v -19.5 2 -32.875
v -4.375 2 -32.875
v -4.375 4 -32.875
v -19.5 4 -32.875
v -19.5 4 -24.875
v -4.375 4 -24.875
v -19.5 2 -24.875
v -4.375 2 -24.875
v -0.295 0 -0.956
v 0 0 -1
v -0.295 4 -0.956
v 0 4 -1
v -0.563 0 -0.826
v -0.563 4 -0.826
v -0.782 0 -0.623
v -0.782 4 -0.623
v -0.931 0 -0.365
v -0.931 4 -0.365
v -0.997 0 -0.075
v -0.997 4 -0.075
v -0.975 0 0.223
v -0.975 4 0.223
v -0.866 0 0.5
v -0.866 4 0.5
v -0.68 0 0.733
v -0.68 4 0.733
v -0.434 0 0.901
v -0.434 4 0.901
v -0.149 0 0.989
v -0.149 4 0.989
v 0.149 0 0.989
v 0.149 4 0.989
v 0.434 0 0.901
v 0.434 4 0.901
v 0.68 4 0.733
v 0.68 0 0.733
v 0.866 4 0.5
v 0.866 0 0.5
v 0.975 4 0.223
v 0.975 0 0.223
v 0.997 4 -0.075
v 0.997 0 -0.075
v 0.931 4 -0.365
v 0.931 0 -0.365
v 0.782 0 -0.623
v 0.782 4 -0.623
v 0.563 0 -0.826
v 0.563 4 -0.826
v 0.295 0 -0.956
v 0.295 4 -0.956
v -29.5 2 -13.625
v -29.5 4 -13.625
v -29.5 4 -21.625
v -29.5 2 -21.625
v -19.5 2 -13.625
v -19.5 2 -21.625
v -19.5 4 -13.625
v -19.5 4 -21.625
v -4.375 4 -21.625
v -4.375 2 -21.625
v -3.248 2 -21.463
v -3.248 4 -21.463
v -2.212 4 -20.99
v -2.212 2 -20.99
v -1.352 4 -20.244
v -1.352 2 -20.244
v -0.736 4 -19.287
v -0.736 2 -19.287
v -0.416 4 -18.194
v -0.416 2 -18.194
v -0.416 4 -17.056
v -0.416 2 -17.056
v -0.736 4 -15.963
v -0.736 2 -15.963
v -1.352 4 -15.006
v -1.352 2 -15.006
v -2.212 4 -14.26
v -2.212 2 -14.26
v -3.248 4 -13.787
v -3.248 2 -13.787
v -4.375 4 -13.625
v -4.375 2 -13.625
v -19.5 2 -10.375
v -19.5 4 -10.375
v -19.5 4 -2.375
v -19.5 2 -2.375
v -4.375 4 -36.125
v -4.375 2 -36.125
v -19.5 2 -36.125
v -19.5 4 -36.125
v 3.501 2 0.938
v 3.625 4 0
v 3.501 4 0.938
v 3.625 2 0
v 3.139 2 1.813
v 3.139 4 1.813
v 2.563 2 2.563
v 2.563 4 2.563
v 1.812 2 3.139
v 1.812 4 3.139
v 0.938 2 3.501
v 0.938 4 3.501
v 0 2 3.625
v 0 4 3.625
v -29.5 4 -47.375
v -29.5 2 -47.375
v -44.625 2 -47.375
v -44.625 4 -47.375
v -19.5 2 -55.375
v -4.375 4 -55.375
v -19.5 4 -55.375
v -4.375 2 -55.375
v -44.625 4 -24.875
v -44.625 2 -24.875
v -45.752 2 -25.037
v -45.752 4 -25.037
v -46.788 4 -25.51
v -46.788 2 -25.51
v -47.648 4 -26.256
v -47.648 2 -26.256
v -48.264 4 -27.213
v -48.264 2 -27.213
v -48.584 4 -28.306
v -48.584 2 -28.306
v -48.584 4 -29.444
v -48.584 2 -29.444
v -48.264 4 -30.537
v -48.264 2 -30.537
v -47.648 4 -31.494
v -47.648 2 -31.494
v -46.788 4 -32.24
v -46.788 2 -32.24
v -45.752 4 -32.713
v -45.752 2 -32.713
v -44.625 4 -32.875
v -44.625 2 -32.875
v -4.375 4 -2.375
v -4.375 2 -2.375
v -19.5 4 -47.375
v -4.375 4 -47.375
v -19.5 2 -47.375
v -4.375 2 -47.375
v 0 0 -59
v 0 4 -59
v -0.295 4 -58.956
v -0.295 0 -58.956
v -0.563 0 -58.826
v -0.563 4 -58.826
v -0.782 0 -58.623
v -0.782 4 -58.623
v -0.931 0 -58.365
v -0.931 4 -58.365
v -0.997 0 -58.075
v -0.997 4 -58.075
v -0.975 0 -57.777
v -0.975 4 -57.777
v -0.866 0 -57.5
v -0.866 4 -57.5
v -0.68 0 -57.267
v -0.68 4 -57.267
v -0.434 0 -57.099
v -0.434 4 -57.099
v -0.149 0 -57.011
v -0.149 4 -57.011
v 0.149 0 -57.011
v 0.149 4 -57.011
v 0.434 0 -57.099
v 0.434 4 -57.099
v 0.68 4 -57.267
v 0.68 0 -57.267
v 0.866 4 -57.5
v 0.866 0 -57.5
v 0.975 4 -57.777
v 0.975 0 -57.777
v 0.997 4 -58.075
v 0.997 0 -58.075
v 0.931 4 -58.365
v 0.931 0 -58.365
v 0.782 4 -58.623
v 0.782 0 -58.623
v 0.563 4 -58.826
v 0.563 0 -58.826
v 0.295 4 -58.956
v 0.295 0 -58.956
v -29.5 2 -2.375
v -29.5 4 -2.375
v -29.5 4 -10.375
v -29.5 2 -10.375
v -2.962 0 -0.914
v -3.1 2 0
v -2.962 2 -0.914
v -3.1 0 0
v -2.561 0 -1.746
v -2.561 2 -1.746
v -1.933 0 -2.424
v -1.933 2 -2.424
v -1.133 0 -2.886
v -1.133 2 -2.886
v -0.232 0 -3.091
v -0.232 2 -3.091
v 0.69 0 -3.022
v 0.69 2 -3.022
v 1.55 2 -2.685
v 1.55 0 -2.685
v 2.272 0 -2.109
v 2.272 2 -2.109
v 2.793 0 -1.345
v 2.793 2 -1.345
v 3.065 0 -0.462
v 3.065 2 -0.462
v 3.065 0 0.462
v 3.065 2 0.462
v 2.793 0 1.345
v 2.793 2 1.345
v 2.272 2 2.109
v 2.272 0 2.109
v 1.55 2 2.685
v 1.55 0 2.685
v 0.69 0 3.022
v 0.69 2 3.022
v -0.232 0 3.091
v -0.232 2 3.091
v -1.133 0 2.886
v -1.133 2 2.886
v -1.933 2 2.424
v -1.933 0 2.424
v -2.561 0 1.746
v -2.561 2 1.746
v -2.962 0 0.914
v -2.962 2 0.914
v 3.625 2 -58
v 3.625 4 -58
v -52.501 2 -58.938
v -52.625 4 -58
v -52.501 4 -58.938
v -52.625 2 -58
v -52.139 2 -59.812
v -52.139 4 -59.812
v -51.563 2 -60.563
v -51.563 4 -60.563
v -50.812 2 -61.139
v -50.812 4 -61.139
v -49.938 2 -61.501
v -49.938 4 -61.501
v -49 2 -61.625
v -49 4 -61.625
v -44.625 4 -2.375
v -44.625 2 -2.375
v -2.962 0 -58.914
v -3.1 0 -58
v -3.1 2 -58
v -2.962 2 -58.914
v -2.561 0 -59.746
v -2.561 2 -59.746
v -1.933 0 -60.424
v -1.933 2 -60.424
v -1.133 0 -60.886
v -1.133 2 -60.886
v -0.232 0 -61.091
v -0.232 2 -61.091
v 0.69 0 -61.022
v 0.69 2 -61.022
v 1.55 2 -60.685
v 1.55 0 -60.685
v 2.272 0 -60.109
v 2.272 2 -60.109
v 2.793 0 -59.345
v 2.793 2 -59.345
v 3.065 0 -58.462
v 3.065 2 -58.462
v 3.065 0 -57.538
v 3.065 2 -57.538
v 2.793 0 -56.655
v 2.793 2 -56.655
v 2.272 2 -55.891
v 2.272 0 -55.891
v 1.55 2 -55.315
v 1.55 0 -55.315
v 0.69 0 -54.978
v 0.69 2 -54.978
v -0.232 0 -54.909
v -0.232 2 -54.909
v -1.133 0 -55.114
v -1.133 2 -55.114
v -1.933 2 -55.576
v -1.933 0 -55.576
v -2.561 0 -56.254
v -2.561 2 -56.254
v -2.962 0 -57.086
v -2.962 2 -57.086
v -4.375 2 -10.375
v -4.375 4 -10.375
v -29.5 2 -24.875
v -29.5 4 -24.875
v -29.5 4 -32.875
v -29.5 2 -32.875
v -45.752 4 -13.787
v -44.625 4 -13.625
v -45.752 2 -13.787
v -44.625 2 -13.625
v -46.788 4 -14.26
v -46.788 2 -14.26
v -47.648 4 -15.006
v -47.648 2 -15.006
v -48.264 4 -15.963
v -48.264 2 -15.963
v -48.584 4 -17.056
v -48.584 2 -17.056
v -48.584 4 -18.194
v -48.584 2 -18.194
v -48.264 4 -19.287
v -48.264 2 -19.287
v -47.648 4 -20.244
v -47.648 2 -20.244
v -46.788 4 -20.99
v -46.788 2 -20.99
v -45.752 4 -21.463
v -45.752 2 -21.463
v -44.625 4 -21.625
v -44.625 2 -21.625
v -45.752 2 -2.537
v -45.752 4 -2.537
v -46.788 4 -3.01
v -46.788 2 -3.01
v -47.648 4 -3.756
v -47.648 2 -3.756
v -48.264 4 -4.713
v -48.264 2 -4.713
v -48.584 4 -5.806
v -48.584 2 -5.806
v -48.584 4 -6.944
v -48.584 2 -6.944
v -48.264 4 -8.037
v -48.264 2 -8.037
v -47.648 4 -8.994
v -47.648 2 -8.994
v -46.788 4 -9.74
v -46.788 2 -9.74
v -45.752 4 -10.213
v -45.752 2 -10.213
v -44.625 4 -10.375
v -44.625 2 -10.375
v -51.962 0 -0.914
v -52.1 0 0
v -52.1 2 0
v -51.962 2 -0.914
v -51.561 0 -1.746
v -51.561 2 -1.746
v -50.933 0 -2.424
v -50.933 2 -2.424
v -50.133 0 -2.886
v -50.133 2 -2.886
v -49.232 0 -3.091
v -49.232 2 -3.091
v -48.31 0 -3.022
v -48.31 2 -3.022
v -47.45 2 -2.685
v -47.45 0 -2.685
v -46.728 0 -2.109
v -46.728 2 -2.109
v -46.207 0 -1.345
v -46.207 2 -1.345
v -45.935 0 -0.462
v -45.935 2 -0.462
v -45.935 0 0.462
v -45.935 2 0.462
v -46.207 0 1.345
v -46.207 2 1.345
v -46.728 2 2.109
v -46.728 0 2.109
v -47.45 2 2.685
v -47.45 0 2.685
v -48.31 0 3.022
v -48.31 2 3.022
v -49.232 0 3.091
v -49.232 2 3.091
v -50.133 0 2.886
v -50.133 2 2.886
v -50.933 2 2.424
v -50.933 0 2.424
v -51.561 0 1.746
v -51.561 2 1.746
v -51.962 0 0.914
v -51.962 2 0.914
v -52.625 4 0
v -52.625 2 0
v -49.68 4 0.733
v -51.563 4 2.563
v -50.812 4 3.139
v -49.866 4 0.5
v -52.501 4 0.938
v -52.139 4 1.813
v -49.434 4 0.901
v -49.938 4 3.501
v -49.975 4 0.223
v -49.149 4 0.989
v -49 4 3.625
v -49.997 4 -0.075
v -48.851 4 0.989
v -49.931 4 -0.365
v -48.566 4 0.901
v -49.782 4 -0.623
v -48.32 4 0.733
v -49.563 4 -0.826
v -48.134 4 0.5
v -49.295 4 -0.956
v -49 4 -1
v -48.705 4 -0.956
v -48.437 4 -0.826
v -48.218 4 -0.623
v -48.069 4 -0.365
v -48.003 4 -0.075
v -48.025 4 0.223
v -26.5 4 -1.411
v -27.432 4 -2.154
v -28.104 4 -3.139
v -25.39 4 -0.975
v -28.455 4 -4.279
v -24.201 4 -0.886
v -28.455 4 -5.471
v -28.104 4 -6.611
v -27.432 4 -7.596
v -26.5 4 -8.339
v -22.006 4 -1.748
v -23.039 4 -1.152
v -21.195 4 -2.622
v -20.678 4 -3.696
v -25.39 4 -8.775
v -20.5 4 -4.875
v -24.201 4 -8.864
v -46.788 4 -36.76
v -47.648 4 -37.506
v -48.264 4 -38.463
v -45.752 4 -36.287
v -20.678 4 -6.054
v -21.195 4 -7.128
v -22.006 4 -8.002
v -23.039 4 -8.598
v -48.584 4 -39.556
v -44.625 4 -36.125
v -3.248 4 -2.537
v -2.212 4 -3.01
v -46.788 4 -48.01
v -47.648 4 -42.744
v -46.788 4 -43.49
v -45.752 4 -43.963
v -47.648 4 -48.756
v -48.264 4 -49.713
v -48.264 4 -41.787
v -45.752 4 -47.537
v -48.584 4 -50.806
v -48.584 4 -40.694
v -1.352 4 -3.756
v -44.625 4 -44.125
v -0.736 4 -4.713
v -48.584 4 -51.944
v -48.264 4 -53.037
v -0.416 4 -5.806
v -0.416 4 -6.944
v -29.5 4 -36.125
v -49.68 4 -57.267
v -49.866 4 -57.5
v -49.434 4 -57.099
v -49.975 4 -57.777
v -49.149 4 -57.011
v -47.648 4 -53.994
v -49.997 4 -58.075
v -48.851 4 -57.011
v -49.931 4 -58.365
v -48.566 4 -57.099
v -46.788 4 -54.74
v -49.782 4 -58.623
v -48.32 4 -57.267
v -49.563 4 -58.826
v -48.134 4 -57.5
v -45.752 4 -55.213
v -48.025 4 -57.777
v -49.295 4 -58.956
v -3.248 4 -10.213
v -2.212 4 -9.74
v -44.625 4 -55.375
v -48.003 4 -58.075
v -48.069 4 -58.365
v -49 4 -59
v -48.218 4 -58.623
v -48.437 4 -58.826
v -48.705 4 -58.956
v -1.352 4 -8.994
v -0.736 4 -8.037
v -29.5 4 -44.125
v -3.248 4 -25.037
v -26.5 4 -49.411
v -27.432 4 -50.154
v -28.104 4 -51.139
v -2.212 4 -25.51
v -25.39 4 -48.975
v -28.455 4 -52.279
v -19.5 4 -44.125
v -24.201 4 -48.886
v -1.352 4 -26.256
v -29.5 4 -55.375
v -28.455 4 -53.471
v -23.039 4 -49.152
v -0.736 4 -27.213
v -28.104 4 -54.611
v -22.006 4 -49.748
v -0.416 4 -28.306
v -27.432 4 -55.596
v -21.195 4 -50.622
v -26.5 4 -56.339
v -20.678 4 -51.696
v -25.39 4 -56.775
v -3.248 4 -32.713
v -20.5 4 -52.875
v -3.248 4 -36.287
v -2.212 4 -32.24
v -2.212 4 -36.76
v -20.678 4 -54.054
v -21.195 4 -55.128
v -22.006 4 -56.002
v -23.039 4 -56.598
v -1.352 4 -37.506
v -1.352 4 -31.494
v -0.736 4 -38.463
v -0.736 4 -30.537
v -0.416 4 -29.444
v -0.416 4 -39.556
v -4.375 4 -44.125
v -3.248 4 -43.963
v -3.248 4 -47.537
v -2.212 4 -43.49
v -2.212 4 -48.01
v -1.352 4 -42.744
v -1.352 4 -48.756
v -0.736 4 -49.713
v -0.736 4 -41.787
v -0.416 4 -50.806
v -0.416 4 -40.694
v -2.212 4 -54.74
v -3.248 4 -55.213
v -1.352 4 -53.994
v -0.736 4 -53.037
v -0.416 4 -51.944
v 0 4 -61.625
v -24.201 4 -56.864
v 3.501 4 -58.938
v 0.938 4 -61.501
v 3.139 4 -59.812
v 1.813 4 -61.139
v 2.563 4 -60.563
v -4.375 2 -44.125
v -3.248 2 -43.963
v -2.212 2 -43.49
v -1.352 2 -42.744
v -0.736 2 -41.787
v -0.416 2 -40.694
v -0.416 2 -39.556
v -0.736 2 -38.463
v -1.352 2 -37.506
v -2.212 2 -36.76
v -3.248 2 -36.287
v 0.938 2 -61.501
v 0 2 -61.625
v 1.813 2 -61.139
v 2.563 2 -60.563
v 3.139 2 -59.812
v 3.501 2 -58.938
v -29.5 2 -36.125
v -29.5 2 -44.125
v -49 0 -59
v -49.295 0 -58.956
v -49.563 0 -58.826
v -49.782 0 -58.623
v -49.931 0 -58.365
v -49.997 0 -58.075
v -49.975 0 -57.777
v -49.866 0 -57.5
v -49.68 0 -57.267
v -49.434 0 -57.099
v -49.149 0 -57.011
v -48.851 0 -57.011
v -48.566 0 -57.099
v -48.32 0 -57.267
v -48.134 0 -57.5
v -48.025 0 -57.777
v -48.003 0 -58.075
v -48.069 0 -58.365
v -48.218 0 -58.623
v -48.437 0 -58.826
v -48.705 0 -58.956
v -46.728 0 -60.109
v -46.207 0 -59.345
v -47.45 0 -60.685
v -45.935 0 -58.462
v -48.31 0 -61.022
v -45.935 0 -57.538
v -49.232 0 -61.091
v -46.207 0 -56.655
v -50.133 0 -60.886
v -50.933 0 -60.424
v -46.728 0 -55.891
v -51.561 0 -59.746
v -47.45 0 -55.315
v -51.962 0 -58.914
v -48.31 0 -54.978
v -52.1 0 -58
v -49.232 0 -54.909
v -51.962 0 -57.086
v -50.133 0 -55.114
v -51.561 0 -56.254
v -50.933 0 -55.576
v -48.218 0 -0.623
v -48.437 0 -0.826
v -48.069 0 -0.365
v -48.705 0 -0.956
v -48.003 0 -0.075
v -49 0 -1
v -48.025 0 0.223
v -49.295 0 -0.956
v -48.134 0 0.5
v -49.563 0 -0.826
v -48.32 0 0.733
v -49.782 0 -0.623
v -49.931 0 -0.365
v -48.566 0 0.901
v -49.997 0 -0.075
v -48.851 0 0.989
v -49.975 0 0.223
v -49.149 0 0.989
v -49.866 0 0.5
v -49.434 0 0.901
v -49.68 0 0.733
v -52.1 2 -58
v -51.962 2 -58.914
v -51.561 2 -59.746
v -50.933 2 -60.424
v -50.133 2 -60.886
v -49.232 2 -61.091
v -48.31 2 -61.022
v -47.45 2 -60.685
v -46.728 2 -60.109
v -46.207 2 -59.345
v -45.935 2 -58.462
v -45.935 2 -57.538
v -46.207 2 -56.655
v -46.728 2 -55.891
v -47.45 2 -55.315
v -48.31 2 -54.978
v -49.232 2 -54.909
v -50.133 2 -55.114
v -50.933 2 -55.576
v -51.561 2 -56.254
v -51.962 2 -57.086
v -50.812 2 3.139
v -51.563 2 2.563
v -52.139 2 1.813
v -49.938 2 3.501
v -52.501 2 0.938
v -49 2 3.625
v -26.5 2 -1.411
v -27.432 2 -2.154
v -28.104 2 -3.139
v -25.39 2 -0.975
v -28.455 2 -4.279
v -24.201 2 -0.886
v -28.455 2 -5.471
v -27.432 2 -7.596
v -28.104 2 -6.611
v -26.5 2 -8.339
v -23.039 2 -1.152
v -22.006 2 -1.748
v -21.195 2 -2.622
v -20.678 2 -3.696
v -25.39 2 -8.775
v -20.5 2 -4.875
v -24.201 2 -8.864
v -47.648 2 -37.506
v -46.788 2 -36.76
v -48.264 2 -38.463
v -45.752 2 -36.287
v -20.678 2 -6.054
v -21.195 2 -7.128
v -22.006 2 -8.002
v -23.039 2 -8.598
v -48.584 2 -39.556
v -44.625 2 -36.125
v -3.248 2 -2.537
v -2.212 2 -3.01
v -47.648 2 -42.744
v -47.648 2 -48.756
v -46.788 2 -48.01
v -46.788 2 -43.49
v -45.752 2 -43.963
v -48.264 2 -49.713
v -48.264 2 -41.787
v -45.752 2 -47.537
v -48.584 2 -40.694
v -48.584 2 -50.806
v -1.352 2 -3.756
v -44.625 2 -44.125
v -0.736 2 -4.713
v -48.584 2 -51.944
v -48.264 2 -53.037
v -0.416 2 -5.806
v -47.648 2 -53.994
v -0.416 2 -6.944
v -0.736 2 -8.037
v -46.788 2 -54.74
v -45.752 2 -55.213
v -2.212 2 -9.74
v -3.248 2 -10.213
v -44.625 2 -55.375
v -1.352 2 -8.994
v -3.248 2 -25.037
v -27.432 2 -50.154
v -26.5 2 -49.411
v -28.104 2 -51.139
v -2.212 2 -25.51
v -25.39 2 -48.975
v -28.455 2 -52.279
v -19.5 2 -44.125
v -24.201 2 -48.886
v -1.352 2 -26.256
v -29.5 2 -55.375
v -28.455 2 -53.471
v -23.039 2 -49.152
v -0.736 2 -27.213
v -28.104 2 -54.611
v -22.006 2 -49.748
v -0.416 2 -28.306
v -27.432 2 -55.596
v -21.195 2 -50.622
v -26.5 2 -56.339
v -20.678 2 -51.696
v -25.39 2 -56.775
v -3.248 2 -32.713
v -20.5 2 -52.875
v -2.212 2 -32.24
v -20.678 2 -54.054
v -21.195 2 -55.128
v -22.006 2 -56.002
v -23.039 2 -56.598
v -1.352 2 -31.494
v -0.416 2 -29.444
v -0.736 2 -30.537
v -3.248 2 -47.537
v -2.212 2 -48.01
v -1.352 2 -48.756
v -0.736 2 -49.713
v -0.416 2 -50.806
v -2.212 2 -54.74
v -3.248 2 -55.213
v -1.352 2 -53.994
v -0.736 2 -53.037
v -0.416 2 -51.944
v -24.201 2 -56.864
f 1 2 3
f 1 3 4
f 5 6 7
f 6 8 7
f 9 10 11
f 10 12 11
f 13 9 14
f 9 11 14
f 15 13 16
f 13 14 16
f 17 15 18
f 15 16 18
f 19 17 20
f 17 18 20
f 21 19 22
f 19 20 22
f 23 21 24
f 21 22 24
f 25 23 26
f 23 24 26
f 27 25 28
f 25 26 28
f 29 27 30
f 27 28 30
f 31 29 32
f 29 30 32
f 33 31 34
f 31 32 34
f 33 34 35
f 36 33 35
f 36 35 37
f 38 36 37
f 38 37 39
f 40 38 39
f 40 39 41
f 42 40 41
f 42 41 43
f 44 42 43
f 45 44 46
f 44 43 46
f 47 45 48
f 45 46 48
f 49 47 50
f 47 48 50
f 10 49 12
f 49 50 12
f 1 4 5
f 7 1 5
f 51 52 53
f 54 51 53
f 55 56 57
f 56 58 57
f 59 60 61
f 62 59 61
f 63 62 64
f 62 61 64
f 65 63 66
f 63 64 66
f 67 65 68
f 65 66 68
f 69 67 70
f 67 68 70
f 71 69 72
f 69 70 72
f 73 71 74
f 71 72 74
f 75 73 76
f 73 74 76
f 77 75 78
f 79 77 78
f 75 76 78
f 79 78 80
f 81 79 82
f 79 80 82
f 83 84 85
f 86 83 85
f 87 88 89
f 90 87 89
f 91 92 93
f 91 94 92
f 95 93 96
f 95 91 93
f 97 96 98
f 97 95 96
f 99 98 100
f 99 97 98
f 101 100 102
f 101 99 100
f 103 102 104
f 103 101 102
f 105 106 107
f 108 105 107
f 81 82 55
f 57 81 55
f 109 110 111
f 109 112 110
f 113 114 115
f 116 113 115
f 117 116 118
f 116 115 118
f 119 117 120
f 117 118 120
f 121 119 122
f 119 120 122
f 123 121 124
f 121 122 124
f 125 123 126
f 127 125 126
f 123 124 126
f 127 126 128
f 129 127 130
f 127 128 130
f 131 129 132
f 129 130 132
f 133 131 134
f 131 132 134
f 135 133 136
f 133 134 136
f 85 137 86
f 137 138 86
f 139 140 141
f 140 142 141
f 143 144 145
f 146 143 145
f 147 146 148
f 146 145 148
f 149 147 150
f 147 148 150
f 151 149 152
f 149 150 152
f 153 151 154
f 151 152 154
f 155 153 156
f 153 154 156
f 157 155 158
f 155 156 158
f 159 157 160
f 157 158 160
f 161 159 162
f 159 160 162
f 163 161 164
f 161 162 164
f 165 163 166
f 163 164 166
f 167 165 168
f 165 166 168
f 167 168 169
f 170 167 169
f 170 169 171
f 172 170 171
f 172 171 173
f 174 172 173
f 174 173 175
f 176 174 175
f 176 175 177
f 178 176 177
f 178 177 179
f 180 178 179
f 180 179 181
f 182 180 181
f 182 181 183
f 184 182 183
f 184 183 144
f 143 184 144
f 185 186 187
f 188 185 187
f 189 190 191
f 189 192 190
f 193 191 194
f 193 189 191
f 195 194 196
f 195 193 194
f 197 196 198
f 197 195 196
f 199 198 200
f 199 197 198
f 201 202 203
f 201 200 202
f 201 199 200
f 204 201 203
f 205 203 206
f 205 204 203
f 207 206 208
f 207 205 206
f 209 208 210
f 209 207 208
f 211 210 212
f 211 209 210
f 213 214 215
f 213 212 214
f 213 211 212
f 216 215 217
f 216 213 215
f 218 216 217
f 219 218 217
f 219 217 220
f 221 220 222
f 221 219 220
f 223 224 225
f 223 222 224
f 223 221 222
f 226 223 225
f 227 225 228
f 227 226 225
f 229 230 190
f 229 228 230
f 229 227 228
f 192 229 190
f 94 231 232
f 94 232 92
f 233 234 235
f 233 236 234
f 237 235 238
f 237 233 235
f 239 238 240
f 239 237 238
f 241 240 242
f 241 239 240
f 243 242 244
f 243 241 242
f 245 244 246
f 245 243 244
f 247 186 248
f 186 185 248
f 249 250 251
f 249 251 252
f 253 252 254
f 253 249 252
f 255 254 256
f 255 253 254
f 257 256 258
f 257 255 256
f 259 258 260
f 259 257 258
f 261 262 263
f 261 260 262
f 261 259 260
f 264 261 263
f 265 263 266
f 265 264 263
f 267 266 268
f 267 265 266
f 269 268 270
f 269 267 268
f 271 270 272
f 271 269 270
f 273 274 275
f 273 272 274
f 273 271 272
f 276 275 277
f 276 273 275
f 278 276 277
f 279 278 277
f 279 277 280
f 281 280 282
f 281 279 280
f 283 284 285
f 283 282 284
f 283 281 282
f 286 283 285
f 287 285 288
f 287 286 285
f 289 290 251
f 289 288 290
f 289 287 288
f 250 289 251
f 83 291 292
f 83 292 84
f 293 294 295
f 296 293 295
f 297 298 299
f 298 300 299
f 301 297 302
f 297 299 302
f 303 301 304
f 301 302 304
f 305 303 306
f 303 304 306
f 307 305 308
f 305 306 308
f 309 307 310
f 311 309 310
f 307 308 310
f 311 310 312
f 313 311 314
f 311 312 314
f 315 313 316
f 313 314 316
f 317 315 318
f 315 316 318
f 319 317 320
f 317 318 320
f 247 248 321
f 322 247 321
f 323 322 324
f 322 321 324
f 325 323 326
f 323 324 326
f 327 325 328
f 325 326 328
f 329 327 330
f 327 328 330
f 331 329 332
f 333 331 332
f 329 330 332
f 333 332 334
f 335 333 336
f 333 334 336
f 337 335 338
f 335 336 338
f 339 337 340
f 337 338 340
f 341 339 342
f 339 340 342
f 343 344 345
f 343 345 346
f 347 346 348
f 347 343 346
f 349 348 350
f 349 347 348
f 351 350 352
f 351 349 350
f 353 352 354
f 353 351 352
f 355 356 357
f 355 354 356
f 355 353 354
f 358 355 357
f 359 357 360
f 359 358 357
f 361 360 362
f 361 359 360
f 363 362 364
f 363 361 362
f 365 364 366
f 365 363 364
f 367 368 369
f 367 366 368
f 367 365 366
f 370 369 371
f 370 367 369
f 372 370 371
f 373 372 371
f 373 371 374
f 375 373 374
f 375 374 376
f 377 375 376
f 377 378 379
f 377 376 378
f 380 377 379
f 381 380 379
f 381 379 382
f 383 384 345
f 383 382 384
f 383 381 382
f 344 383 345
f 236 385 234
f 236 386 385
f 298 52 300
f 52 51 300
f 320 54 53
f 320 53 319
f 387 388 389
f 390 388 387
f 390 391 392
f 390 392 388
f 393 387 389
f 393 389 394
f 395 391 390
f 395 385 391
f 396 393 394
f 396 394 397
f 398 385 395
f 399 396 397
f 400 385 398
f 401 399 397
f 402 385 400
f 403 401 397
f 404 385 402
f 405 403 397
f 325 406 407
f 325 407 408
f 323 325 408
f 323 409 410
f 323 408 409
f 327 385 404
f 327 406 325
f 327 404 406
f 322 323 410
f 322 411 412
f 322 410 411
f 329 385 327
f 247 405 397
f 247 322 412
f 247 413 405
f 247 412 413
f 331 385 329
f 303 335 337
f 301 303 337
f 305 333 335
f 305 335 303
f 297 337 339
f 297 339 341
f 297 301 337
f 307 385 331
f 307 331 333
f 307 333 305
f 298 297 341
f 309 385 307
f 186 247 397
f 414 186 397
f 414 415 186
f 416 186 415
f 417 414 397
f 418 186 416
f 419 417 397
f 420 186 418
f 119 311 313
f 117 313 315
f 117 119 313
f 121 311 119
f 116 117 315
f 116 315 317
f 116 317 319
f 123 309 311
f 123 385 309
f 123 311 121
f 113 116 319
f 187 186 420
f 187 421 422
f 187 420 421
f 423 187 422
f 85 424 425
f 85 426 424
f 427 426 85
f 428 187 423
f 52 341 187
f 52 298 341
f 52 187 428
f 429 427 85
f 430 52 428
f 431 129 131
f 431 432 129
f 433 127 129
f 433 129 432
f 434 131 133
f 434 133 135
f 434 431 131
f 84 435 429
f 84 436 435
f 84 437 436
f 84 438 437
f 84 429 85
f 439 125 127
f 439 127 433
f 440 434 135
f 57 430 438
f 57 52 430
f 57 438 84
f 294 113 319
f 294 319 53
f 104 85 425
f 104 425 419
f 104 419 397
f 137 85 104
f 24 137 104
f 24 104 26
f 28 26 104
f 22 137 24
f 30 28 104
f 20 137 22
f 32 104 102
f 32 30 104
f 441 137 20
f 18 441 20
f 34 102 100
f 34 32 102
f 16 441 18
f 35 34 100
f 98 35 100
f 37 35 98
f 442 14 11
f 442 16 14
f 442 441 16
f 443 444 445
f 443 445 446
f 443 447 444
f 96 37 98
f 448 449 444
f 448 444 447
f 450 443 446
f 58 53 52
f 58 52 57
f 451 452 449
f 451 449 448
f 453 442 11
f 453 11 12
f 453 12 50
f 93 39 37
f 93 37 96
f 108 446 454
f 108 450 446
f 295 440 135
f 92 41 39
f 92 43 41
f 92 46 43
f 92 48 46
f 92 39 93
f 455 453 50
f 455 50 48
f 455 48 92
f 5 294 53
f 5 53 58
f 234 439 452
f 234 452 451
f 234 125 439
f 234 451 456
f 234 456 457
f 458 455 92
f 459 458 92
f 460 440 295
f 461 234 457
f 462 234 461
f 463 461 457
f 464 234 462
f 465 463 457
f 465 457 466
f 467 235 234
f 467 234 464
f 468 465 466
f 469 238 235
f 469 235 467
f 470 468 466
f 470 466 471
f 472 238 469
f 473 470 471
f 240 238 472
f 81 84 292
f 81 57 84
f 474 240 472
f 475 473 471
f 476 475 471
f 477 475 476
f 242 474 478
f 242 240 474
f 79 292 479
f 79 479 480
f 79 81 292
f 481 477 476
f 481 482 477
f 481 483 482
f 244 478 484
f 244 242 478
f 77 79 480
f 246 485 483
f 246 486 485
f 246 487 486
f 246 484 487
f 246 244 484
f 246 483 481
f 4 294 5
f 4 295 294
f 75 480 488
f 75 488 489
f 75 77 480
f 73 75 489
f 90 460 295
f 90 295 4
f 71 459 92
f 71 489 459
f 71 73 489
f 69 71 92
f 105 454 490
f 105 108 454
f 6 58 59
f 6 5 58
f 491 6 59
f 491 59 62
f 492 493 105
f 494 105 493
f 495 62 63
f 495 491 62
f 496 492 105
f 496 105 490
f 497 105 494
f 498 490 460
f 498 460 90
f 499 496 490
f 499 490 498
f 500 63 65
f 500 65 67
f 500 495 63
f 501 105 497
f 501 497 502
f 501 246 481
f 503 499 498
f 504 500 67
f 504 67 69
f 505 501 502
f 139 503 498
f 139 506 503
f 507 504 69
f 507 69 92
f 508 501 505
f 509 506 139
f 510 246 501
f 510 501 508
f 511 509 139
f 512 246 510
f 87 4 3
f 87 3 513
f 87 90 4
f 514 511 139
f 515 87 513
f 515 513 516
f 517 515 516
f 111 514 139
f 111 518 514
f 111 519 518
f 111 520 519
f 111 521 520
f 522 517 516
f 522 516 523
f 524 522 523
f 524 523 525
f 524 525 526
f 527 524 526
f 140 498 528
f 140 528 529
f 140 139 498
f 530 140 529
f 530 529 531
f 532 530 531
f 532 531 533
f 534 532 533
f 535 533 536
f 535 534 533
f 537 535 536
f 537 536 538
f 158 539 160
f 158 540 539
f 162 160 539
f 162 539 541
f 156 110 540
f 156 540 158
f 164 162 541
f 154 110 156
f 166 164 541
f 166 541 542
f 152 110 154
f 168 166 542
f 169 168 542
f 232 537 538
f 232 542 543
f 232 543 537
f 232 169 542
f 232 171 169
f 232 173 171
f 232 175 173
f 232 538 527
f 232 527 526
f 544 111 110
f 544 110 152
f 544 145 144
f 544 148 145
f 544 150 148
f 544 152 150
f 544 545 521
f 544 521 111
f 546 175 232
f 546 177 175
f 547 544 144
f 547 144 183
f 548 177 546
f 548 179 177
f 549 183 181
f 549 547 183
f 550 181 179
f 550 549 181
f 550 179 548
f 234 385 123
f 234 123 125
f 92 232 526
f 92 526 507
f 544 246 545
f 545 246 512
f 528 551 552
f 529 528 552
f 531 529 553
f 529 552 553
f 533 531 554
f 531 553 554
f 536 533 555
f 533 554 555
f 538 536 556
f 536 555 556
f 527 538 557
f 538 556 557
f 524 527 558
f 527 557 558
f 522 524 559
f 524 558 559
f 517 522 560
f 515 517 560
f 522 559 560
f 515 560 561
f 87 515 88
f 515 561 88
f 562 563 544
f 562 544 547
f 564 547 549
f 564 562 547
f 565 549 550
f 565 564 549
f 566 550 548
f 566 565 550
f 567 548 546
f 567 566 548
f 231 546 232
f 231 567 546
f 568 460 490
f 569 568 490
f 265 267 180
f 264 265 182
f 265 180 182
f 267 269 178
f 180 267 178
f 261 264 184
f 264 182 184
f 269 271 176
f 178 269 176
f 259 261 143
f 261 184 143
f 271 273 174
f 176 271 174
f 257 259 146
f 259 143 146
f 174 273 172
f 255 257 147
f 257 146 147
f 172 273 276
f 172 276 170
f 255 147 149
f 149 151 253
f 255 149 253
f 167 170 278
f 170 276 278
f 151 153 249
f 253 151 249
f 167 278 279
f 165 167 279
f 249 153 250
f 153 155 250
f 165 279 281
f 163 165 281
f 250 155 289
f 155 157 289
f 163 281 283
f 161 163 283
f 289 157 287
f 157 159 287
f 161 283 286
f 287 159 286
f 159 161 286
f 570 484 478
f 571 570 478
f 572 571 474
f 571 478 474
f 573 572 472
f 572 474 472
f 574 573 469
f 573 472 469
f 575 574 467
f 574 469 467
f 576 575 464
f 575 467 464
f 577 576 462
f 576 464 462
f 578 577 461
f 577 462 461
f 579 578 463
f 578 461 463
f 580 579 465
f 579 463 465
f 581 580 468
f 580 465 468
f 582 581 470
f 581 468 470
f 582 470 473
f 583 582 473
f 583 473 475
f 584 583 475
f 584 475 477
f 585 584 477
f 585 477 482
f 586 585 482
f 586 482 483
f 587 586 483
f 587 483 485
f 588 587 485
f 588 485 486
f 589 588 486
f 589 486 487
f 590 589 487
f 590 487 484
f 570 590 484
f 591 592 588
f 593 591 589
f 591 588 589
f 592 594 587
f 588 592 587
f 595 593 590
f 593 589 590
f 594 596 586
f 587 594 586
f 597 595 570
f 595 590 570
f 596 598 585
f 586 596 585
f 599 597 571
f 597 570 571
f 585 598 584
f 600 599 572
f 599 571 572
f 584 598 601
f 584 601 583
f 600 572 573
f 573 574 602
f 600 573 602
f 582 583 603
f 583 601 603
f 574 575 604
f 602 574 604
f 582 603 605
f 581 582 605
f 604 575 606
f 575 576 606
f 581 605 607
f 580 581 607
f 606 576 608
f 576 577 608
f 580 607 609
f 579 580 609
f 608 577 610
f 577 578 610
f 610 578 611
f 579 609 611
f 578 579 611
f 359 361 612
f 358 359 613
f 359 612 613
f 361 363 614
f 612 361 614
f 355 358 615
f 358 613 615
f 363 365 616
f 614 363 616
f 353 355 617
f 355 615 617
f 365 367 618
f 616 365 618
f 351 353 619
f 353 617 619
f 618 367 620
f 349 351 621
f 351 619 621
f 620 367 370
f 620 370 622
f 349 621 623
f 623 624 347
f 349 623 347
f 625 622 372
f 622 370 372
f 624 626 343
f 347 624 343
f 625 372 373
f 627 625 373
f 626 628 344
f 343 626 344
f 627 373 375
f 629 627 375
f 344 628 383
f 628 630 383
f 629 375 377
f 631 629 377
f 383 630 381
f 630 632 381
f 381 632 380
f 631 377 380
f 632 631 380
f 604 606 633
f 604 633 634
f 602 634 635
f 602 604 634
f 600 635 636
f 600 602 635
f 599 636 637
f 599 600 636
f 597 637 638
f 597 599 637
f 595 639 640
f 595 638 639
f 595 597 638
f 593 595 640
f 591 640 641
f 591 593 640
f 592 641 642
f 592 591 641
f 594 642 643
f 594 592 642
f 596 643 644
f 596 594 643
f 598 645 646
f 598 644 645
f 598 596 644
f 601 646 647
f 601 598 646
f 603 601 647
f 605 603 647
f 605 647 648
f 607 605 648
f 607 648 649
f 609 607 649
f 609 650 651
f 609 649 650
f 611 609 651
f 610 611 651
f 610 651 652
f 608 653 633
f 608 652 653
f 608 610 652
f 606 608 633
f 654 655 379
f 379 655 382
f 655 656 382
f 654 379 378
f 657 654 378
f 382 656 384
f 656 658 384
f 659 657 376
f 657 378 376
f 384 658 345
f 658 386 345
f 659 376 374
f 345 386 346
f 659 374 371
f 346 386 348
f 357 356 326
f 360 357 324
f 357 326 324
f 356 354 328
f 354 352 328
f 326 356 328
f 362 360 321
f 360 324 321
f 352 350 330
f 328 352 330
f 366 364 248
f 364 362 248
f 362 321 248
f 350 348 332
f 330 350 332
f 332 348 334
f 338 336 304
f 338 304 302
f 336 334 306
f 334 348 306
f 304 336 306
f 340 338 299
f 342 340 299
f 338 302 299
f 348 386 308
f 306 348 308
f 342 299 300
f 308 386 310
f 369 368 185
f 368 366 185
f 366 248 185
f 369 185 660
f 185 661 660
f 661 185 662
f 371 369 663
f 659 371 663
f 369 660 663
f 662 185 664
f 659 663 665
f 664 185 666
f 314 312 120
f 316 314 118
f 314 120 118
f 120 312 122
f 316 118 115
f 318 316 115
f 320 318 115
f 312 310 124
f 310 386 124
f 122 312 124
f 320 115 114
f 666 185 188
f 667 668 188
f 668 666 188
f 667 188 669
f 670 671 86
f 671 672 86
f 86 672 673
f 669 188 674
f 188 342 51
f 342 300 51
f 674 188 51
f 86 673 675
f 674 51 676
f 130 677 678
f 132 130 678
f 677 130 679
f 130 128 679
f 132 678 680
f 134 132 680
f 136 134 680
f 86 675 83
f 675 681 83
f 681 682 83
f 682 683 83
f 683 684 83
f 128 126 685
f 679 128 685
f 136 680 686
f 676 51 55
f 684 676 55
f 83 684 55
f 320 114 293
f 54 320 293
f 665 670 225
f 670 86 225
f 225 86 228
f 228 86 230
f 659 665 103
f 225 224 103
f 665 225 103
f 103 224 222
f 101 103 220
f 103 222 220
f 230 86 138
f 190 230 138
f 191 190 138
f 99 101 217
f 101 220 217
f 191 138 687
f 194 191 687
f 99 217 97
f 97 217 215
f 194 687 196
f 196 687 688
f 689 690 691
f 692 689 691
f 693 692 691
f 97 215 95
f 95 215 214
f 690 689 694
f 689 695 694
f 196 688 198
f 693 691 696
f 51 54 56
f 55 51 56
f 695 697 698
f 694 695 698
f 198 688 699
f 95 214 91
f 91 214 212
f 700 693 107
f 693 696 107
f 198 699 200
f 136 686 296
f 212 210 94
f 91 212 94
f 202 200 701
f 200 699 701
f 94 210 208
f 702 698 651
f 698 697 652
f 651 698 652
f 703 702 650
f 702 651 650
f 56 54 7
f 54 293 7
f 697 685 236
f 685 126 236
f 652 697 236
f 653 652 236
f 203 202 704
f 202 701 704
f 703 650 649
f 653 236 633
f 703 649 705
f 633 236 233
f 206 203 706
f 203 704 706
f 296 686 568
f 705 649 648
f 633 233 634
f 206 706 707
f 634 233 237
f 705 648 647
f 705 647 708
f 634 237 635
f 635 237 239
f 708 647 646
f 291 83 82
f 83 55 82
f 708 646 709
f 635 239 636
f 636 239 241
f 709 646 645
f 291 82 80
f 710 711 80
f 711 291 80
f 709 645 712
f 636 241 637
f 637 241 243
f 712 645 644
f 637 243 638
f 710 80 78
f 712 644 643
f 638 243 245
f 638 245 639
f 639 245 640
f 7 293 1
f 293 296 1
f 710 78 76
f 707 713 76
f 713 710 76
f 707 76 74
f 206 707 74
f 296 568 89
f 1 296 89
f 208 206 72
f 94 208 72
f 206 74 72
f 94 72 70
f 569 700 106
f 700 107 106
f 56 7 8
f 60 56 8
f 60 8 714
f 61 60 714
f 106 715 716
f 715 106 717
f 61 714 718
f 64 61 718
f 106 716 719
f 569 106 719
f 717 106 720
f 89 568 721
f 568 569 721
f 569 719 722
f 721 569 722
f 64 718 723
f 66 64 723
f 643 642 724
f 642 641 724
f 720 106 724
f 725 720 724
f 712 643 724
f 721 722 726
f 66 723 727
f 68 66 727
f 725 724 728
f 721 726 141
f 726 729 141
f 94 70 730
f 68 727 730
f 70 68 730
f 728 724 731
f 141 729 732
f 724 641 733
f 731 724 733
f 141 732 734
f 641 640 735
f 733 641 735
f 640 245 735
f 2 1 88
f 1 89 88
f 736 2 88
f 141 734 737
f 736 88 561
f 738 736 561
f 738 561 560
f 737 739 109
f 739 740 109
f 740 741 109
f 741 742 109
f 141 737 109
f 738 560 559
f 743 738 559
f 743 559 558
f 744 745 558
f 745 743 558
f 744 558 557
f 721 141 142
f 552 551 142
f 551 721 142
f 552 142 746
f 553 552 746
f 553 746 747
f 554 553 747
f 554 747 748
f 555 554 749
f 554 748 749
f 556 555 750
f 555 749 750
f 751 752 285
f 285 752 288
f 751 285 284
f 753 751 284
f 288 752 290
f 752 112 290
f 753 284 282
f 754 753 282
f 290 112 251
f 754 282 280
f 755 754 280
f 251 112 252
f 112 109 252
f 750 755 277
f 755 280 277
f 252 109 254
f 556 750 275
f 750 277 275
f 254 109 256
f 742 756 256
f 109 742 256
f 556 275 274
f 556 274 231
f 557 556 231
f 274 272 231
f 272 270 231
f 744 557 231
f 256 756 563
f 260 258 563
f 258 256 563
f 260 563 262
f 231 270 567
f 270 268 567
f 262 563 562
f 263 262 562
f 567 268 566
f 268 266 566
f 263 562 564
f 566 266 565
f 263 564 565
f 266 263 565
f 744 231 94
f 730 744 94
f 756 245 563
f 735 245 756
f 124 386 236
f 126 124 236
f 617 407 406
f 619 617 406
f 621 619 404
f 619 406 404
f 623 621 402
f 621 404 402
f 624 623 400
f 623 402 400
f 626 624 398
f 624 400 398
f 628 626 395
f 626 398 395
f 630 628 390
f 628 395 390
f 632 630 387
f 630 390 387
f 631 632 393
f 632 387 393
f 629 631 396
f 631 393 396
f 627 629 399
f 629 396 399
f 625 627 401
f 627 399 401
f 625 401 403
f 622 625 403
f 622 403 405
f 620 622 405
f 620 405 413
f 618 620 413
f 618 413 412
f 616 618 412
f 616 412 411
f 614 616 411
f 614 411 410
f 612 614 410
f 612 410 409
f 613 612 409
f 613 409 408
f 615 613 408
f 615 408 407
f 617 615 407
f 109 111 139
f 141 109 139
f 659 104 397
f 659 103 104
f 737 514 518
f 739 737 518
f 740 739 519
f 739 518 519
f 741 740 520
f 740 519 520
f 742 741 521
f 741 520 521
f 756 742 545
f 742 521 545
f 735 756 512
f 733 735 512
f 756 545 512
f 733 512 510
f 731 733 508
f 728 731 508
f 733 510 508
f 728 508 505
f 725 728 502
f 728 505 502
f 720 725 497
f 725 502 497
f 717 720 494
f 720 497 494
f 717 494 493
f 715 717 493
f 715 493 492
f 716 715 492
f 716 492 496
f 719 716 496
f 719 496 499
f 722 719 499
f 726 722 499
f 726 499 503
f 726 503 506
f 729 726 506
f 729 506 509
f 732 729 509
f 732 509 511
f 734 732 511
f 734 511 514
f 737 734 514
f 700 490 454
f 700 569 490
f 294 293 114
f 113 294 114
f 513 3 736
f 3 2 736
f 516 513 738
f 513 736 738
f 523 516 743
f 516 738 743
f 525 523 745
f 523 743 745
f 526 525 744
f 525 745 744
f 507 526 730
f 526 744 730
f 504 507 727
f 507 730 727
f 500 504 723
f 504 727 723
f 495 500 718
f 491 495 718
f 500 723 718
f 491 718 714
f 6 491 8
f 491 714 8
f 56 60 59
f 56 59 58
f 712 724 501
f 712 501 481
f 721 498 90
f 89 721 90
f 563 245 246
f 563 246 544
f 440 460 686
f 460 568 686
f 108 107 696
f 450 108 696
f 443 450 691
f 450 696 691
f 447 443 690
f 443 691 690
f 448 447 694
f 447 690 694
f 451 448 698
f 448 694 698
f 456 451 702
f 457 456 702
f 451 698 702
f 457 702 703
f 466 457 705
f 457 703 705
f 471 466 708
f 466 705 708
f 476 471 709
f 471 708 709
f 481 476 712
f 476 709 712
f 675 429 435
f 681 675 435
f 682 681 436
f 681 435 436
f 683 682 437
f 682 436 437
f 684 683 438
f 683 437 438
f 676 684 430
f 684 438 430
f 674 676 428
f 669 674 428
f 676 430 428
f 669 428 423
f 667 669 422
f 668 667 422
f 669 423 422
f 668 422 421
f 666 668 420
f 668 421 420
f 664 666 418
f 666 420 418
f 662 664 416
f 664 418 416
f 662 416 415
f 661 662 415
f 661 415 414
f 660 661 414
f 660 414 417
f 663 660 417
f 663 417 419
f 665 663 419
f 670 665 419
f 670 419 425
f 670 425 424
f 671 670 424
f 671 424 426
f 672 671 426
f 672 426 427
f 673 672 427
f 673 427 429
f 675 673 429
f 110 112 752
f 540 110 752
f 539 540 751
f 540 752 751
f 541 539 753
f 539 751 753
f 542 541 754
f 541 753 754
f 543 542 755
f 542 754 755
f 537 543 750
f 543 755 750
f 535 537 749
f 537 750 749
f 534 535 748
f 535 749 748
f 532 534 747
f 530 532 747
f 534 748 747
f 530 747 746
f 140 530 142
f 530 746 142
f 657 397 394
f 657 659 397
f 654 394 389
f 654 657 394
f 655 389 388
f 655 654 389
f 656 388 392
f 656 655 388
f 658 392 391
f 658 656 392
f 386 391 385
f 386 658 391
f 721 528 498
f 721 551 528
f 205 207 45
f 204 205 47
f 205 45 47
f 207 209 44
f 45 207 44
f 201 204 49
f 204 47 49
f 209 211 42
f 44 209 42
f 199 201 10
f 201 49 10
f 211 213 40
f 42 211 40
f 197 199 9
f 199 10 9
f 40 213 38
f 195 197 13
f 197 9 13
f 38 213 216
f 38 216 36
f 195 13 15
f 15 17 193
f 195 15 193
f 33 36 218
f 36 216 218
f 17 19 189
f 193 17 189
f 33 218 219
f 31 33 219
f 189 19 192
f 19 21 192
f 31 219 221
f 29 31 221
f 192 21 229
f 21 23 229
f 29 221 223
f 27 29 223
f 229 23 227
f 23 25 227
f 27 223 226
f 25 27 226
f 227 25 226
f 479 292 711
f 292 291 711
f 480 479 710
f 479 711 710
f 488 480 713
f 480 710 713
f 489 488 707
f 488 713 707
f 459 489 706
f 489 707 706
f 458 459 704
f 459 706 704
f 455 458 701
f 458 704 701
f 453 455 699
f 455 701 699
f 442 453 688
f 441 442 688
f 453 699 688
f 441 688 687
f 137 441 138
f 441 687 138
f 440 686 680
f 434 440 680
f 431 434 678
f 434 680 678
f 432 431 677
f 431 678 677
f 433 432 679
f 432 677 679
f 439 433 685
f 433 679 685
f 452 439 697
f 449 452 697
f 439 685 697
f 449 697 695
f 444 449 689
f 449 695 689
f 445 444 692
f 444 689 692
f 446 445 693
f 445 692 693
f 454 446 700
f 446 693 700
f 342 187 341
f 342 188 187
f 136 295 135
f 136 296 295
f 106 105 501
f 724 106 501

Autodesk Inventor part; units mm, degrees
ref_plane "YZ Plane" through (0, 0, 0) normal (1, 0, 0) x (0, 1, 0)
sketch "Sketch1" plane through (0, 0, 0) normal (0, 1, 0) x (-1, 0, 0)
  circle A0 centre (0, 0) radius 3.1
  circle A1 centre (49, 0) radius 3.1
  circle A2 centre (49, -58) radius 3.1
  circle A3 centre (0, -58) radius 3.1
  dimension "d4" = 6.2
  dimension "d5" = 6.2
  dimension "d6" = 6.2
  dimension "d7" = 6.2
  dimension "d12" = 58
  dimension "d13" = 58
  dimension "d14" = 49
  dimension "d15" = 49
extrude "Extrusion1" add sketch "Sketch1" along normal blind 2
sketch "Sketch3" plane through (0, 2, 0) normal (0, 1, 0) x (1, 0, 0)
  circle A0 centre (0, 0) radius 3.1 projected
  circle A1 centre (0, 0) radius 3.625
  circle A2 centre (0, 58) radius 3.1 projected
  circle A3 centre (0, 58) radius 3.625
  circle A4 centre (-49, 58) radius 3.1 projected
  circle A5 centre (-49, 58) radius 3.625
  circle A6 centre (-49, 0) radius 3.1 projected
  circle A7 centre (-49, 0) radius 3.625
  line L0 (-52.625, 0) -> (-52.625, 58)
  line L1 (-49, 61.625) -> (0, 61.625)
  line L2 (3.625, 58) -> (3.625, 0)
  line L3 (0, -3.625) -> (-49, -3.625)
  dimension "d18" = 7.25
  dimension "d19" = 7.25
  dimension "d20" = 7.25
  dimension "d21" = 7.25
extrude "Extrusion2" add sketch "Sketch3" along normal blind 2 contours A0 | A1 | A1 L3 A7 L0 A5 L1 A3 L2 | A3 | A7 | A5 | A2 | A4 | A6
sketch "Sketch5" plane through (0, 2, 0) normal (0, -1, 0) x (1, 0, 0)
  circle A0 centre (-4.375, -6.375) radius 4
  circle A1 centre (-44.625, -6.375) radius 4
  line L0 (3.625, 0) -> (3.625, -58) projected
  line L1 (-52.625, -58) -> (-52.625, 0) projected
  line L2 (-49, 3.625) -> (0, 3.625) projected
  line L3 (-4.375, -2.375) -> (-44.625, -2.375)
  line L4 (-4.375, -10.375) -> (-44.625, -10.375)
  circle A2 centre (-4.375, -17.625) radius 4
  line L5 (-4.375, -13.625) -> (-44.625, -13.625)
  line L6 (-4.375, -21.625) -> (-44.625, -21.625)
  circle A3 centre (-44.625, -17.625) radius 4
  circle A4 centre (-4.375, -28.875) radius 4
  line L7 (-4.375, -24.875) -> (-44.625, -24.875)
  line L8 (-4.375, -32.875) -> (-44.625, -32.875)
  circle A5 centre (-44.625, -28.875) radius 4
  circle A6 centre (-4.375, -40.125) radius 4
  line L9 (-4.375, -36.125) -> (-44.625, -36.125)
  line L10 (-4.375, -44.125) -> (-44.625, -44.125)
  circle A7 centre (-44.625, -40.125) radius 4
  circle A8 centre (-4.375, -51.375) radius 4
  line L11 (-4.375, -47.375) -> (-44.625, -47.375)
  line L12 (-4.375, -55.375) -> (-44.625, -55.375)
  circle A9 centre (-44.625, -51.375) radius 4
  point P0 (0, 0)
  dimension "d27" = 8
  dimension "d28" = 8
  dimension "d29" = 8
  dimension "d30" = 8
  dimension "d31" = 10
  dimension "d32" = 10
  dimension "d35" = 11.25
extrude "Extrusion3" cut sketch "Sketch5" against normal blind 2
sketch "Sketch6" plane through (0, 0, 0) normal (0, -1, 0) x (1, 0, 0)
  circle A0 centre (0, 0) radius 3.1 projected
  circle A1 centre (-49, -58) radius 3.1 projected
  line L0 (0, 0) -> (-49, 0)
  line L1 (-49, 0) -> (-49, -58)
  line L2 (-49, -58) -> (0, -58)
  line L3 (0, -58) -> (0, 0)
hole "Hole1" at (0, 0, -58) at (0, 0, 0) at (-49, 0, 0) at (-49, 0, -58) direction (0, 1, 0) diameter 2 end through all
sketch "Sketch7" plane through (0, 4, 0) normal (0, 1, 0) x (1, 0, 0)
  circle A0 centre (-24.5, 52.875) radius 4
  circle A1 centre (-24.5, 4.875) radius 4
  line L0 (-49, -3.625) -> (0, -3.625) projected
  point P0 (0, 0)
  dimension "d49" = 8
  dimension "d50" = 8
  dimension "d51" = 48
  dimension "d52" = 8.5
ref_plane "Work Plane2" through (0, 4, 0) normal (0, -1, 0) x (1, 0, 0)
sketch "Sketch8" plane through (0, 4, 0) normal (0, -1, 0) x (1, 0, 0)
  line L0 (-29.5, -61.5) -> (-19.5, -61.5)
  line L1 (-19.5, -61.5) -> (-19.5, 3.5)
  line L2 (-19.5, 3.5) -> (-29.5, 3.5)
  line L3 (-29.5, 3.5) -> (-29.5, -61.5)
  arc A0 (-27.6225, -2.5) -> (-21.3775, -2.5) centre (-24.5, -5) ccw projected
  point P0 (0, 0)
  dimension "d55" = 10
  dimension "d56" = 5
extrude "Extrusion5" add sketch "Sketch8" along normal up to surface (2 mm away)
ref_plane "Work Plane1" through (-24.5, 7, -5) normal (0, 1, 0) x (1, 0, 0)
extrude "Extrusion6" cut sketch "Sketch7" against normal blind 10
equation "\"d18\" = d19"
equation "\"d20\" = d19"
equation "\"d21\" = d19"
properties part number "Pi_mount"
